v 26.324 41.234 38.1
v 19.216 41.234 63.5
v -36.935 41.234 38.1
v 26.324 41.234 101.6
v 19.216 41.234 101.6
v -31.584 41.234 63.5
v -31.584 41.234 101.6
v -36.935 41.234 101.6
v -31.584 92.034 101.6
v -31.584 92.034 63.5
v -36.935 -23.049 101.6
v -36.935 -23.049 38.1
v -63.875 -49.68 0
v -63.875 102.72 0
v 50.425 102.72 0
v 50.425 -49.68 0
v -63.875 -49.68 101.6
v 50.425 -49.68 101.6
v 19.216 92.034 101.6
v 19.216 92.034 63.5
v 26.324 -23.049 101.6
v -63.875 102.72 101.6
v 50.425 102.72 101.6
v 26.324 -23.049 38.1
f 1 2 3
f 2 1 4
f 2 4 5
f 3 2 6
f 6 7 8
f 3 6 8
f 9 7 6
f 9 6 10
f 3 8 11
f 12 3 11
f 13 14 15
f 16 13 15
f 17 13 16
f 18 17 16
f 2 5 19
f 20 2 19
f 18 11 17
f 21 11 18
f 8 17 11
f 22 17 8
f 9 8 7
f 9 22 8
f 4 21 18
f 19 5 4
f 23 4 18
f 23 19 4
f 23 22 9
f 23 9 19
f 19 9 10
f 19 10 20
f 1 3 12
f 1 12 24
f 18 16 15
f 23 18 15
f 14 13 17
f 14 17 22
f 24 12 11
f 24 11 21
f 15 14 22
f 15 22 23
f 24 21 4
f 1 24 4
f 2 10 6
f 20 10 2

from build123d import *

# Parameters (mm, degrees)
F0_W     = 114.3
F0_H     = 152.4
F1_DEPTH = 101.6
F2_W     = 50.8
F2_H     = 50.8
F3_DEPTH = 38.1
F5_DEPTH = 63.5


with BuildPart() as f1:
    # F0 (on Top) → F1 (new body)
    with BuildSketch(Plane.XY):
        with Locations((-6.724683, 26.519689)):
            Rectangle(F0_W, F0_H)
    extrude(amount=F1_DEPTH)

    # F2 (on face) → F3 (cut)
    with BuildSketch(Plane.XY.offset(101.6)):
        with Locations((-6.183666, 66.633569)):
            Rectangle(F2_W, F2_H)
    extrude(amount=-F3_DEPTH, mode=Mode.SUBTRACT)

    # F4 (on face) → F5 (cut)
    with BuildSketch(Plane.XY.offset(101.6)):
        Polygon((19.216334, 41.233569), (-31.583666, 41.233569), (-36.934618, 41.233569), (-36.934618, -23.049315), (26.324298, -23.049315), (26.324298, 41.233569), align=None)
    extrude(amount=-F5_DEPTH, mode=Mode.SUBTRACT)


solid = f1.part
